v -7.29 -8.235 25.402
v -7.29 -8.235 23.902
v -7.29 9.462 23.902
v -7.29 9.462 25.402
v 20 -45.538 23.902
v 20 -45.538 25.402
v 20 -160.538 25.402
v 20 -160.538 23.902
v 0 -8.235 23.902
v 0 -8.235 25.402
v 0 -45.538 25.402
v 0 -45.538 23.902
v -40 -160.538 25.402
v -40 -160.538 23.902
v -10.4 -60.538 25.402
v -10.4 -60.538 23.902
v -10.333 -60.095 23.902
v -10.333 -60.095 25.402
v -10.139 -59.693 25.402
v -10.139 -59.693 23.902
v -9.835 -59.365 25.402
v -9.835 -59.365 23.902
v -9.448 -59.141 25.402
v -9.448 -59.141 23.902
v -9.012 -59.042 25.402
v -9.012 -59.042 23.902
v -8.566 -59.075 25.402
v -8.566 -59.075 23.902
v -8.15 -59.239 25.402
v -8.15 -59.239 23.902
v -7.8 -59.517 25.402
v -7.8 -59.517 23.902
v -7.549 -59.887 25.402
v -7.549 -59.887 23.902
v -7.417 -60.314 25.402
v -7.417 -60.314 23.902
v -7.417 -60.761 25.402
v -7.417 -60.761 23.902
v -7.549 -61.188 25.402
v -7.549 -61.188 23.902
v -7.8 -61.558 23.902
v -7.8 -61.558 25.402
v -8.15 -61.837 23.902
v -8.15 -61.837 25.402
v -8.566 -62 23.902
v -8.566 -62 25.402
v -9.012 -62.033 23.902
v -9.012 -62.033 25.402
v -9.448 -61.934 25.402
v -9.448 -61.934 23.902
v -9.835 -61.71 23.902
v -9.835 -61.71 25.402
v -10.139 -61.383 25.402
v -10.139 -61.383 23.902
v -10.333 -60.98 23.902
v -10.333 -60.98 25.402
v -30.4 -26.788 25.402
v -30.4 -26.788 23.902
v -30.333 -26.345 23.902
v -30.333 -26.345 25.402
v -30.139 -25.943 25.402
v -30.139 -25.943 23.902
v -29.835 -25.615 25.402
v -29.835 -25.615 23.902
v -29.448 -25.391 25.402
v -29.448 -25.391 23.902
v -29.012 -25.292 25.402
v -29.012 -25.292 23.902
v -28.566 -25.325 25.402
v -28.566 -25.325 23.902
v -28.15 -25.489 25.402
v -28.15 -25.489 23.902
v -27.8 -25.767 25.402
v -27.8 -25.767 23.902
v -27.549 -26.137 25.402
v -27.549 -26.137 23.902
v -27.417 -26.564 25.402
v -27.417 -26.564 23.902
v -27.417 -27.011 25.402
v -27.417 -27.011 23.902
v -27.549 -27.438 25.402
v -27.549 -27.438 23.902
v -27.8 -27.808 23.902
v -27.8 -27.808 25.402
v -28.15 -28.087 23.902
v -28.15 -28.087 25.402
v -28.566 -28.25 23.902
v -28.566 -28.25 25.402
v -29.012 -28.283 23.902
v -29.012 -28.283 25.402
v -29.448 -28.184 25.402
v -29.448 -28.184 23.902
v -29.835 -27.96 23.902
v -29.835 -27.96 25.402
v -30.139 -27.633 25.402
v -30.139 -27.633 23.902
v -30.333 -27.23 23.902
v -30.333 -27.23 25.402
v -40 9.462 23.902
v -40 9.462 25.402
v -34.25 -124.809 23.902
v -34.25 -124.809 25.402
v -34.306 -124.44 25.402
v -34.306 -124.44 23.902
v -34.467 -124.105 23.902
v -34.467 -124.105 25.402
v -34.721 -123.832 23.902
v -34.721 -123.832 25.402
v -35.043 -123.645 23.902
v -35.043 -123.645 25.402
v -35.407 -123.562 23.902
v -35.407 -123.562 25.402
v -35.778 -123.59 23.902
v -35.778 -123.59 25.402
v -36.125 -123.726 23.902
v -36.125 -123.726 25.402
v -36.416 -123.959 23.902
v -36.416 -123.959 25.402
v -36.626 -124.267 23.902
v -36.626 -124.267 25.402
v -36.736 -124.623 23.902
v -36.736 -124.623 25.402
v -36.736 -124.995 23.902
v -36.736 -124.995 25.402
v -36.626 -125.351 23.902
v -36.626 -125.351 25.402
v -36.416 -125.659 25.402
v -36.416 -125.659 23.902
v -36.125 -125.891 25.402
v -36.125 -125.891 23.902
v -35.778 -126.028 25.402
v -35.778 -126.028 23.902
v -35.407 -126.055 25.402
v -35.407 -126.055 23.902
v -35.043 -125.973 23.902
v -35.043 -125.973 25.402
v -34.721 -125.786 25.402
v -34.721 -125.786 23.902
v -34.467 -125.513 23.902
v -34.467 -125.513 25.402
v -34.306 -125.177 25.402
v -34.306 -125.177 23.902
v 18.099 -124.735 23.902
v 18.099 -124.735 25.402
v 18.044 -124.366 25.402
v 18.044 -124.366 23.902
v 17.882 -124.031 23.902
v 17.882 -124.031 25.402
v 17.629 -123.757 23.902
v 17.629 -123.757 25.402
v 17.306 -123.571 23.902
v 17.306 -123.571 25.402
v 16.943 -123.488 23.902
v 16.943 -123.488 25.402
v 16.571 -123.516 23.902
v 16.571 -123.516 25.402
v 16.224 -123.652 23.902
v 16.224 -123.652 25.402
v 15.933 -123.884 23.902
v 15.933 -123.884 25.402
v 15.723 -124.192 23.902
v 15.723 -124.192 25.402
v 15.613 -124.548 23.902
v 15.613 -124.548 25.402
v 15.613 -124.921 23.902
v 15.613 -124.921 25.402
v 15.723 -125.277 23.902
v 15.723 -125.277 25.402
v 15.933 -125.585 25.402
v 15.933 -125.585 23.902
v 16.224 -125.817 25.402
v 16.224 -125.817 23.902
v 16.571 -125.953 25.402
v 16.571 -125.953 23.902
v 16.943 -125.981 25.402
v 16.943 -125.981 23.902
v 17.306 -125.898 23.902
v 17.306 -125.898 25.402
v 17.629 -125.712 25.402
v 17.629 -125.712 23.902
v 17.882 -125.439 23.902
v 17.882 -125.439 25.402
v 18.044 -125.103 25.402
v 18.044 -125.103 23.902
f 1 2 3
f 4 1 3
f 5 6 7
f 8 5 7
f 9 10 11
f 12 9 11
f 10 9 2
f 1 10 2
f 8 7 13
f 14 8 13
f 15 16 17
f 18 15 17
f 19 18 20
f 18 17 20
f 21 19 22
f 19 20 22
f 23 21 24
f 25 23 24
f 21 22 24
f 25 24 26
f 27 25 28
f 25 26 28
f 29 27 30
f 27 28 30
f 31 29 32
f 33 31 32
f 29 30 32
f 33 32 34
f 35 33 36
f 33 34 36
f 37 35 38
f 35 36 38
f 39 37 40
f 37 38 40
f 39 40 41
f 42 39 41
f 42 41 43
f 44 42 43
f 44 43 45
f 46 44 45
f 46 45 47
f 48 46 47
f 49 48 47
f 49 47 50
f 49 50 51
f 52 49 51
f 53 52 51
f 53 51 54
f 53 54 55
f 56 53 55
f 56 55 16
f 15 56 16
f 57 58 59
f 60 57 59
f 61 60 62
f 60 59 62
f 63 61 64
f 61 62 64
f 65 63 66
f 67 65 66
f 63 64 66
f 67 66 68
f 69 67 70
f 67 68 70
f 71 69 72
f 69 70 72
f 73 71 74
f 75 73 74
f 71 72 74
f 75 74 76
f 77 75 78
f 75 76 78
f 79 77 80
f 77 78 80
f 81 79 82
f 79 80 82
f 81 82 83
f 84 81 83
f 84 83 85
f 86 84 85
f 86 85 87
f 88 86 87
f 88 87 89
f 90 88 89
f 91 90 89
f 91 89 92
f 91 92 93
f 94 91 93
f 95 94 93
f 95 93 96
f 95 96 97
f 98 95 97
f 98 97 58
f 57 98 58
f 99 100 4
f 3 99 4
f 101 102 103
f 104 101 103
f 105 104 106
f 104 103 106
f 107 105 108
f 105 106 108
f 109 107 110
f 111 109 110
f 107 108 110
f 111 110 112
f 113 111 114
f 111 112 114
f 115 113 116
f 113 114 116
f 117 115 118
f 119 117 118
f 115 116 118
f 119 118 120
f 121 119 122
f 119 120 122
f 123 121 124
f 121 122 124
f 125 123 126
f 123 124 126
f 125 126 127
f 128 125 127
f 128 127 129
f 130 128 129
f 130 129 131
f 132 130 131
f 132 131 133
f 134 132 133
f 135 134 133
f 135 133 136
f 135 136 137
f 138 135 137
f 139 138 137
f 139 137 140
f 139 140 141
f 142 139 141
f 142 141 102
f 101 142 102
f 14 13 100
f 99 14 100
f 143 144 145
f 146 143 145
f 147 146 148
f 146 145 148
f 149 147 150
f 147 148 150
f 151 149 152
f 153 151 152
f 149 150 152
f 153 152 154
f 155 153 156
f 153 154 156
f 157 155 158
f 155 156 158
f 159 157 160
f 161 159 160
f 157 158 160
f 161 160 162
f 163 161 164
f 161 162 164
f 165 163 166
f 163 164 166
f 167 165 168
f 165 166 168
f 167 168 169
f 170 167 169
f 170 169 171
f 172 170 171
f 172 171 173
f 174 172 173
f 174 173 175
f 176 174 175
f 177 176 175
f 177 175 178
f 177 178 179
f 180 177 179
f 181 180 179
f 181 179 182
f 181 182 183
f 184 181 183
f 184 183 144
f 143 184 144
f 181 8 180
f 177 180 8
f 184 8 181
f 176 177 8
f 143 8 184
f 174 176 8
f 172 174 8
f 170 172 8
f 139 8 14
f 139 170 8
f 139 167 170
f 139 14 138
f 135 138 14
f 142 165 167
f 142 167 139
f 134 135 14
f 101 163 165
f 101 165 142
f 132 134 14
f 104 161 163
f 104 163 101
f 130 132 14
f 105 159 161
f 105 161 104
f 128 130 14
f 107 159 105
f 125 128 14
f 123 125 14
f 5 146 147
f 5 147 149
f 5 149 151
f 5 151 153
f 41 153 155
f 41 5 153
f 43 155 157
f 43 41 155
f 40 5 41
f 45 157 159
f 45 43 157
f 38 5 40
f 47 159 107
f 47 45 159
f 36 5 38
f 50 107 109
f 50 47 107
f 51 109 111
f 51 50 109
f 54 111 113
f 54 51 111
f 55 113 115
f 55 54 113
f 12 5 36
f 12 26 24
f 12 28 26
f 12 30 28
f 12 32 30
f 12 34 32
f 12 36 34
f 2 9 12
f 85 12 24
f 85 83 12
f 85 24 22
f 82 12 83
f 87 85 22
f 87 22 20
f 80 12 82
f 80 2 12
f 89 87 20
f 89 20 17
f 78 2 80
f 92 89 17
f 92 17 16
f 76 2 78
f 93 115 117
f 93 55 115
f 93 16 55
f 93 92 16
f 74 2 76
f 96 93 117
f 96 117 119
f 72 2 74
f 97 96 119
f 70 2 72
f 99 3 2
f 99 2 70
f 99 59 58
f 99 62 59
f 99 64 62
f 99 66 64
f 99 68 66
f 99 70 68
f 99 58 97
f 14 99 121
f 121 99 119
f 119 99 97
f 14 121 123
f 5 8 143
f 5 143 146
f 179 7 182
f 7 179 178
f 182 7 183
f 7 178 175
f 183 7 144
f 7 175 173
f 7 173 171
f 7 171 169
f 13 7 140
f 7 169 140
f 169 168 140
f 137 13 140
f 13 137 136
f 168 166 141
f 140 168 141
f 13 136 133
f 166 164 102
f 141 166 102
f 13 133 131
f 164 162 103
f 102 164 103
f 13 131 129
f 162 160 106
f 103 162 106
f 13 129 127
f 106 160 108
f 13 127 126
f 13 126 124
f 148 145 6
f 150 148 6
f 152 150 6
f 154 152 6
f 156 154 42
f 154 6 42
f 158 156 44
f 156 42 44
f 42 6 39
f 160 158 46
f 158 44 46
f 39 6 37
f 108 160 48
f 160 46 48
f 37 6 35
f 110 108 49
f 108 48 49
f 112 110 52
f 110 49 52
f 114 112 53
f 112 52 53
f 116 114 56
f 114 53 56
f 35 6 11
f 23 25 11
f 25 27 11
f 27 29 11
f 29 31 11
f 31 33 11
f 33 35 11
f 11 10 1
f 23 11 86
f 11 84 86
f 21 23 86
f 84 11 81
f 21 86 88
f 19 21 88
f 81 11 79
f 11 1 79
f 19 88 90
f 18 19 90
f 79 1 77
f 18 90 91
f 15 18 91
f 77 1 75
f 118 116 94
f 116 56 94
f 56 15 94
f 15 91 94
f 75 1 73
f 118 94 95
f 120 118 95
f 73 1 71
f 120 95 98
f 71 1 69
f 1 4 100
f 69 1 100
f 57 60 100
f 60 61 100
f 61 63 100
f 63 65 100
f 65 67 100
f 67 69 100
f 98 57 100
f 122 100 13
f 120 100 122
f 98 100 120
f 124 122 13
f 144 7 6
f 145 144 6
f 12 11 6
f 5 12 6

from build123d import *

# Parameters (mm, degrees)
RESSALTO_EXTRUS_O1_DEPTH                   = 1.5
CORTE_EXTRUS_O2_REACH                      = 167.453
ESBO_O5_R                                  = 1.5
BROCA_DE_ROSQUEAR_PARA_TARRAXA_DE_M3X0_5_D = 2.5
CORTE_EXTRUS_O3_REACH                      = 167.453
ESBO_O15_R                                 = 1.5
CORTE_EXTRUS_O4_REACH                      = 167.453
ESBO_O16_W                                 = 7.289764361
ESBO_O16_H                                 = 17.697498775


with BuildPart() as part:
    # Esboço2 → Ressalto-extrusão1 (new body)
    with BuildSketch(Plane(origin=(0, 0, 25.401562241), x_dir=(-1, 0, 0), z_dir=(0, 0, -1))):
        Polygon((40, 9.462441068), (0, 9.462441068), (0, -45.537558932), (-20, -45.537558932), (-20, -160.537558932), (40, -160.537558932), align=None)
    extrude(amount=RESSALTO_EXTRUS_O1_DEPTH)

    # Esboço5 → Corte-extrusão2 (cut, up to next)
    with BuildSketch(Plane(origin=(0, 0, 23.901562241), x_dir=(-1, 0, 0), z_dir=(0, 0, -1)), mode=Mode.PRIVATE) as corte_extrus_o2_sk1:
        with Locations((28.9, -26.787558932)):
            Circle(ESBO_O5_R)
    corte_extrus_o2_tool1 = extrude(corte_extrus_o2_sk1.sketch, amount=-CORTE_EXTRUS_O2_REACH, mode=Mode.PRIVATE) & part.part
    add(corte_extrus_o2_tool1.solids().sort_by_distance((-28.9, -26.787559, 23.901562))[0], mode=Mode.SUBTRACT)

    # Broca de rosquear para tarraxa de M3x0.52 (through all)
    with Locations(Plane(origin=(0, 0, 23.901562241), x_dir=(-1, 0, 0), z_dir=(0, 0, -1))):
        with Locations((-16.849169709, -124.734682683), (35.5, -124.808922584)):
            Hole(BROCA_DE_ROSQUEAR_PARA_TARRAXA_DE_M3X0_5_D / 2)

    # Esboço15 → Corte-extrusão3 (cut, up to next)
    with BuildSketch(Plane(origin=(0, 0, 23.901562241), x_dir=(-1, 0, 0), z_dir=(0, 0, -1)), mode=Mode.PRIVATE) as corte_extrus_o3_sk1:
        with Locations((8.9, -60.537558932)):
            Circle(ESBO_O15_R)
    corte_extrus_o3_tool1 = extrude(corte_extrus_o3_sk1.sketch, amount=-CORTE_EXTRUS_O3_REACH, mode=Mode.PRIVATE) & part.part
    add(corte_extrus_o3_tool1.solids().sort_by_distance((-8.9, -60.537559, 23.901562))[0], mode=Mode.SUBTRACT)

    # Esboço16 → Corte-extrusão4 (cut, up to next)
    with BuildSketch(Plane(origin=(0, 0, 23.901562241), x_dir=(-1, 0, 0), z_dir=(0, 0, -1)), mode=Mode.PRIVATE) as corte_extrus_o4_sk1:
        with Locations((3.644882181, 0.61369168)):
            Rectangle(ESBO_O16_W, ESBO_O16_H)
    corte_extrus_o4_tool1 = extrude(corte_extrus_o4_sk1.sketch, amount=-CORTE_EXTRUS_O4_REACH, mode=Mode.PRIVATE) & part.part
    add(corte_extrus_o4_tool1.solids().sort_by_distance((-3.644882, 0.613692, 23.901562))[0], mode=Mode.SUBTRACT)


solid = part.part
